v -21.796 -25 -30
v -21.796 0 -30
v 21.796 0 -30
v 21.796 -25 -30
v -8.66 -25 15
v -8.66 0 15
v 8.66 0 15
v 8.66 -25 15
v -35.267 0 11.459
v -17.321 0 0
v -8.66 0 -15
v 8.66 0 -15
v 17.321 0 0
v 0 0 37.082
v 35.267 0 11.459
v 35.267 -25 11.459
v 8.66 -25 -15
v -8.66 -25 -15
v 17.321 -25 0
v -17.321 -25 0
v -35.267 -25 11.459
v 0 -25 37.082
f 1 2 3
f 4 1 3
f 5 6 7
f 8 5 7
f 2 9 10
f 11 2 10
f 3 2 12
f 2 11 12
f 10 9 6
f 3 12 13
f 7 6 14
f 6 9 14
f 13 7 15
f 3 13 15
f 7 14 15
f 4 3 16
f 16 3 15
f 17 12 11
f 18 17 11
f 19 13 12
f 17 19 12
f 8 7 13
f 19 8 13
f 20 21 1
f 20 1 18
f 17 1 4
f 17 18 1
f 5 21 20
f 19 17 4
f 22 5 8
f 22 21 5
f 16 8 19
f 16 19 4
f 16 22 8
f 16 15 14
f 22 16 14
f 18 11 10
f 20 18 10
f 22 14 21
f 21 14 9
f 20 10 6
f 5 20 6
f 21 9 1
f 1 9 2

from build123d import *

# Parameters (mm, degrees)
F1_DEPTH = 25


with BuildPart() as f1:
    # F0 (on Front) → F1 (new body)
    with BuildSketch(Plane.XZ):
        Polygon((-21.796276, -30), (21.796276, -30), (35.267115, 11.45898), (0, 37.082039), (-35.267115, 11.45898), align=None)
        Polygon((-17.320508, 0), (-8.660254, 15), (8.660254, 15), (17.320508, 0), (8.660254, -15), (-8.660254, -15), align=None, mode=Mode.SUBTRACT)
    extrude(amount=F1_DEPTH)


solid = f1.part
